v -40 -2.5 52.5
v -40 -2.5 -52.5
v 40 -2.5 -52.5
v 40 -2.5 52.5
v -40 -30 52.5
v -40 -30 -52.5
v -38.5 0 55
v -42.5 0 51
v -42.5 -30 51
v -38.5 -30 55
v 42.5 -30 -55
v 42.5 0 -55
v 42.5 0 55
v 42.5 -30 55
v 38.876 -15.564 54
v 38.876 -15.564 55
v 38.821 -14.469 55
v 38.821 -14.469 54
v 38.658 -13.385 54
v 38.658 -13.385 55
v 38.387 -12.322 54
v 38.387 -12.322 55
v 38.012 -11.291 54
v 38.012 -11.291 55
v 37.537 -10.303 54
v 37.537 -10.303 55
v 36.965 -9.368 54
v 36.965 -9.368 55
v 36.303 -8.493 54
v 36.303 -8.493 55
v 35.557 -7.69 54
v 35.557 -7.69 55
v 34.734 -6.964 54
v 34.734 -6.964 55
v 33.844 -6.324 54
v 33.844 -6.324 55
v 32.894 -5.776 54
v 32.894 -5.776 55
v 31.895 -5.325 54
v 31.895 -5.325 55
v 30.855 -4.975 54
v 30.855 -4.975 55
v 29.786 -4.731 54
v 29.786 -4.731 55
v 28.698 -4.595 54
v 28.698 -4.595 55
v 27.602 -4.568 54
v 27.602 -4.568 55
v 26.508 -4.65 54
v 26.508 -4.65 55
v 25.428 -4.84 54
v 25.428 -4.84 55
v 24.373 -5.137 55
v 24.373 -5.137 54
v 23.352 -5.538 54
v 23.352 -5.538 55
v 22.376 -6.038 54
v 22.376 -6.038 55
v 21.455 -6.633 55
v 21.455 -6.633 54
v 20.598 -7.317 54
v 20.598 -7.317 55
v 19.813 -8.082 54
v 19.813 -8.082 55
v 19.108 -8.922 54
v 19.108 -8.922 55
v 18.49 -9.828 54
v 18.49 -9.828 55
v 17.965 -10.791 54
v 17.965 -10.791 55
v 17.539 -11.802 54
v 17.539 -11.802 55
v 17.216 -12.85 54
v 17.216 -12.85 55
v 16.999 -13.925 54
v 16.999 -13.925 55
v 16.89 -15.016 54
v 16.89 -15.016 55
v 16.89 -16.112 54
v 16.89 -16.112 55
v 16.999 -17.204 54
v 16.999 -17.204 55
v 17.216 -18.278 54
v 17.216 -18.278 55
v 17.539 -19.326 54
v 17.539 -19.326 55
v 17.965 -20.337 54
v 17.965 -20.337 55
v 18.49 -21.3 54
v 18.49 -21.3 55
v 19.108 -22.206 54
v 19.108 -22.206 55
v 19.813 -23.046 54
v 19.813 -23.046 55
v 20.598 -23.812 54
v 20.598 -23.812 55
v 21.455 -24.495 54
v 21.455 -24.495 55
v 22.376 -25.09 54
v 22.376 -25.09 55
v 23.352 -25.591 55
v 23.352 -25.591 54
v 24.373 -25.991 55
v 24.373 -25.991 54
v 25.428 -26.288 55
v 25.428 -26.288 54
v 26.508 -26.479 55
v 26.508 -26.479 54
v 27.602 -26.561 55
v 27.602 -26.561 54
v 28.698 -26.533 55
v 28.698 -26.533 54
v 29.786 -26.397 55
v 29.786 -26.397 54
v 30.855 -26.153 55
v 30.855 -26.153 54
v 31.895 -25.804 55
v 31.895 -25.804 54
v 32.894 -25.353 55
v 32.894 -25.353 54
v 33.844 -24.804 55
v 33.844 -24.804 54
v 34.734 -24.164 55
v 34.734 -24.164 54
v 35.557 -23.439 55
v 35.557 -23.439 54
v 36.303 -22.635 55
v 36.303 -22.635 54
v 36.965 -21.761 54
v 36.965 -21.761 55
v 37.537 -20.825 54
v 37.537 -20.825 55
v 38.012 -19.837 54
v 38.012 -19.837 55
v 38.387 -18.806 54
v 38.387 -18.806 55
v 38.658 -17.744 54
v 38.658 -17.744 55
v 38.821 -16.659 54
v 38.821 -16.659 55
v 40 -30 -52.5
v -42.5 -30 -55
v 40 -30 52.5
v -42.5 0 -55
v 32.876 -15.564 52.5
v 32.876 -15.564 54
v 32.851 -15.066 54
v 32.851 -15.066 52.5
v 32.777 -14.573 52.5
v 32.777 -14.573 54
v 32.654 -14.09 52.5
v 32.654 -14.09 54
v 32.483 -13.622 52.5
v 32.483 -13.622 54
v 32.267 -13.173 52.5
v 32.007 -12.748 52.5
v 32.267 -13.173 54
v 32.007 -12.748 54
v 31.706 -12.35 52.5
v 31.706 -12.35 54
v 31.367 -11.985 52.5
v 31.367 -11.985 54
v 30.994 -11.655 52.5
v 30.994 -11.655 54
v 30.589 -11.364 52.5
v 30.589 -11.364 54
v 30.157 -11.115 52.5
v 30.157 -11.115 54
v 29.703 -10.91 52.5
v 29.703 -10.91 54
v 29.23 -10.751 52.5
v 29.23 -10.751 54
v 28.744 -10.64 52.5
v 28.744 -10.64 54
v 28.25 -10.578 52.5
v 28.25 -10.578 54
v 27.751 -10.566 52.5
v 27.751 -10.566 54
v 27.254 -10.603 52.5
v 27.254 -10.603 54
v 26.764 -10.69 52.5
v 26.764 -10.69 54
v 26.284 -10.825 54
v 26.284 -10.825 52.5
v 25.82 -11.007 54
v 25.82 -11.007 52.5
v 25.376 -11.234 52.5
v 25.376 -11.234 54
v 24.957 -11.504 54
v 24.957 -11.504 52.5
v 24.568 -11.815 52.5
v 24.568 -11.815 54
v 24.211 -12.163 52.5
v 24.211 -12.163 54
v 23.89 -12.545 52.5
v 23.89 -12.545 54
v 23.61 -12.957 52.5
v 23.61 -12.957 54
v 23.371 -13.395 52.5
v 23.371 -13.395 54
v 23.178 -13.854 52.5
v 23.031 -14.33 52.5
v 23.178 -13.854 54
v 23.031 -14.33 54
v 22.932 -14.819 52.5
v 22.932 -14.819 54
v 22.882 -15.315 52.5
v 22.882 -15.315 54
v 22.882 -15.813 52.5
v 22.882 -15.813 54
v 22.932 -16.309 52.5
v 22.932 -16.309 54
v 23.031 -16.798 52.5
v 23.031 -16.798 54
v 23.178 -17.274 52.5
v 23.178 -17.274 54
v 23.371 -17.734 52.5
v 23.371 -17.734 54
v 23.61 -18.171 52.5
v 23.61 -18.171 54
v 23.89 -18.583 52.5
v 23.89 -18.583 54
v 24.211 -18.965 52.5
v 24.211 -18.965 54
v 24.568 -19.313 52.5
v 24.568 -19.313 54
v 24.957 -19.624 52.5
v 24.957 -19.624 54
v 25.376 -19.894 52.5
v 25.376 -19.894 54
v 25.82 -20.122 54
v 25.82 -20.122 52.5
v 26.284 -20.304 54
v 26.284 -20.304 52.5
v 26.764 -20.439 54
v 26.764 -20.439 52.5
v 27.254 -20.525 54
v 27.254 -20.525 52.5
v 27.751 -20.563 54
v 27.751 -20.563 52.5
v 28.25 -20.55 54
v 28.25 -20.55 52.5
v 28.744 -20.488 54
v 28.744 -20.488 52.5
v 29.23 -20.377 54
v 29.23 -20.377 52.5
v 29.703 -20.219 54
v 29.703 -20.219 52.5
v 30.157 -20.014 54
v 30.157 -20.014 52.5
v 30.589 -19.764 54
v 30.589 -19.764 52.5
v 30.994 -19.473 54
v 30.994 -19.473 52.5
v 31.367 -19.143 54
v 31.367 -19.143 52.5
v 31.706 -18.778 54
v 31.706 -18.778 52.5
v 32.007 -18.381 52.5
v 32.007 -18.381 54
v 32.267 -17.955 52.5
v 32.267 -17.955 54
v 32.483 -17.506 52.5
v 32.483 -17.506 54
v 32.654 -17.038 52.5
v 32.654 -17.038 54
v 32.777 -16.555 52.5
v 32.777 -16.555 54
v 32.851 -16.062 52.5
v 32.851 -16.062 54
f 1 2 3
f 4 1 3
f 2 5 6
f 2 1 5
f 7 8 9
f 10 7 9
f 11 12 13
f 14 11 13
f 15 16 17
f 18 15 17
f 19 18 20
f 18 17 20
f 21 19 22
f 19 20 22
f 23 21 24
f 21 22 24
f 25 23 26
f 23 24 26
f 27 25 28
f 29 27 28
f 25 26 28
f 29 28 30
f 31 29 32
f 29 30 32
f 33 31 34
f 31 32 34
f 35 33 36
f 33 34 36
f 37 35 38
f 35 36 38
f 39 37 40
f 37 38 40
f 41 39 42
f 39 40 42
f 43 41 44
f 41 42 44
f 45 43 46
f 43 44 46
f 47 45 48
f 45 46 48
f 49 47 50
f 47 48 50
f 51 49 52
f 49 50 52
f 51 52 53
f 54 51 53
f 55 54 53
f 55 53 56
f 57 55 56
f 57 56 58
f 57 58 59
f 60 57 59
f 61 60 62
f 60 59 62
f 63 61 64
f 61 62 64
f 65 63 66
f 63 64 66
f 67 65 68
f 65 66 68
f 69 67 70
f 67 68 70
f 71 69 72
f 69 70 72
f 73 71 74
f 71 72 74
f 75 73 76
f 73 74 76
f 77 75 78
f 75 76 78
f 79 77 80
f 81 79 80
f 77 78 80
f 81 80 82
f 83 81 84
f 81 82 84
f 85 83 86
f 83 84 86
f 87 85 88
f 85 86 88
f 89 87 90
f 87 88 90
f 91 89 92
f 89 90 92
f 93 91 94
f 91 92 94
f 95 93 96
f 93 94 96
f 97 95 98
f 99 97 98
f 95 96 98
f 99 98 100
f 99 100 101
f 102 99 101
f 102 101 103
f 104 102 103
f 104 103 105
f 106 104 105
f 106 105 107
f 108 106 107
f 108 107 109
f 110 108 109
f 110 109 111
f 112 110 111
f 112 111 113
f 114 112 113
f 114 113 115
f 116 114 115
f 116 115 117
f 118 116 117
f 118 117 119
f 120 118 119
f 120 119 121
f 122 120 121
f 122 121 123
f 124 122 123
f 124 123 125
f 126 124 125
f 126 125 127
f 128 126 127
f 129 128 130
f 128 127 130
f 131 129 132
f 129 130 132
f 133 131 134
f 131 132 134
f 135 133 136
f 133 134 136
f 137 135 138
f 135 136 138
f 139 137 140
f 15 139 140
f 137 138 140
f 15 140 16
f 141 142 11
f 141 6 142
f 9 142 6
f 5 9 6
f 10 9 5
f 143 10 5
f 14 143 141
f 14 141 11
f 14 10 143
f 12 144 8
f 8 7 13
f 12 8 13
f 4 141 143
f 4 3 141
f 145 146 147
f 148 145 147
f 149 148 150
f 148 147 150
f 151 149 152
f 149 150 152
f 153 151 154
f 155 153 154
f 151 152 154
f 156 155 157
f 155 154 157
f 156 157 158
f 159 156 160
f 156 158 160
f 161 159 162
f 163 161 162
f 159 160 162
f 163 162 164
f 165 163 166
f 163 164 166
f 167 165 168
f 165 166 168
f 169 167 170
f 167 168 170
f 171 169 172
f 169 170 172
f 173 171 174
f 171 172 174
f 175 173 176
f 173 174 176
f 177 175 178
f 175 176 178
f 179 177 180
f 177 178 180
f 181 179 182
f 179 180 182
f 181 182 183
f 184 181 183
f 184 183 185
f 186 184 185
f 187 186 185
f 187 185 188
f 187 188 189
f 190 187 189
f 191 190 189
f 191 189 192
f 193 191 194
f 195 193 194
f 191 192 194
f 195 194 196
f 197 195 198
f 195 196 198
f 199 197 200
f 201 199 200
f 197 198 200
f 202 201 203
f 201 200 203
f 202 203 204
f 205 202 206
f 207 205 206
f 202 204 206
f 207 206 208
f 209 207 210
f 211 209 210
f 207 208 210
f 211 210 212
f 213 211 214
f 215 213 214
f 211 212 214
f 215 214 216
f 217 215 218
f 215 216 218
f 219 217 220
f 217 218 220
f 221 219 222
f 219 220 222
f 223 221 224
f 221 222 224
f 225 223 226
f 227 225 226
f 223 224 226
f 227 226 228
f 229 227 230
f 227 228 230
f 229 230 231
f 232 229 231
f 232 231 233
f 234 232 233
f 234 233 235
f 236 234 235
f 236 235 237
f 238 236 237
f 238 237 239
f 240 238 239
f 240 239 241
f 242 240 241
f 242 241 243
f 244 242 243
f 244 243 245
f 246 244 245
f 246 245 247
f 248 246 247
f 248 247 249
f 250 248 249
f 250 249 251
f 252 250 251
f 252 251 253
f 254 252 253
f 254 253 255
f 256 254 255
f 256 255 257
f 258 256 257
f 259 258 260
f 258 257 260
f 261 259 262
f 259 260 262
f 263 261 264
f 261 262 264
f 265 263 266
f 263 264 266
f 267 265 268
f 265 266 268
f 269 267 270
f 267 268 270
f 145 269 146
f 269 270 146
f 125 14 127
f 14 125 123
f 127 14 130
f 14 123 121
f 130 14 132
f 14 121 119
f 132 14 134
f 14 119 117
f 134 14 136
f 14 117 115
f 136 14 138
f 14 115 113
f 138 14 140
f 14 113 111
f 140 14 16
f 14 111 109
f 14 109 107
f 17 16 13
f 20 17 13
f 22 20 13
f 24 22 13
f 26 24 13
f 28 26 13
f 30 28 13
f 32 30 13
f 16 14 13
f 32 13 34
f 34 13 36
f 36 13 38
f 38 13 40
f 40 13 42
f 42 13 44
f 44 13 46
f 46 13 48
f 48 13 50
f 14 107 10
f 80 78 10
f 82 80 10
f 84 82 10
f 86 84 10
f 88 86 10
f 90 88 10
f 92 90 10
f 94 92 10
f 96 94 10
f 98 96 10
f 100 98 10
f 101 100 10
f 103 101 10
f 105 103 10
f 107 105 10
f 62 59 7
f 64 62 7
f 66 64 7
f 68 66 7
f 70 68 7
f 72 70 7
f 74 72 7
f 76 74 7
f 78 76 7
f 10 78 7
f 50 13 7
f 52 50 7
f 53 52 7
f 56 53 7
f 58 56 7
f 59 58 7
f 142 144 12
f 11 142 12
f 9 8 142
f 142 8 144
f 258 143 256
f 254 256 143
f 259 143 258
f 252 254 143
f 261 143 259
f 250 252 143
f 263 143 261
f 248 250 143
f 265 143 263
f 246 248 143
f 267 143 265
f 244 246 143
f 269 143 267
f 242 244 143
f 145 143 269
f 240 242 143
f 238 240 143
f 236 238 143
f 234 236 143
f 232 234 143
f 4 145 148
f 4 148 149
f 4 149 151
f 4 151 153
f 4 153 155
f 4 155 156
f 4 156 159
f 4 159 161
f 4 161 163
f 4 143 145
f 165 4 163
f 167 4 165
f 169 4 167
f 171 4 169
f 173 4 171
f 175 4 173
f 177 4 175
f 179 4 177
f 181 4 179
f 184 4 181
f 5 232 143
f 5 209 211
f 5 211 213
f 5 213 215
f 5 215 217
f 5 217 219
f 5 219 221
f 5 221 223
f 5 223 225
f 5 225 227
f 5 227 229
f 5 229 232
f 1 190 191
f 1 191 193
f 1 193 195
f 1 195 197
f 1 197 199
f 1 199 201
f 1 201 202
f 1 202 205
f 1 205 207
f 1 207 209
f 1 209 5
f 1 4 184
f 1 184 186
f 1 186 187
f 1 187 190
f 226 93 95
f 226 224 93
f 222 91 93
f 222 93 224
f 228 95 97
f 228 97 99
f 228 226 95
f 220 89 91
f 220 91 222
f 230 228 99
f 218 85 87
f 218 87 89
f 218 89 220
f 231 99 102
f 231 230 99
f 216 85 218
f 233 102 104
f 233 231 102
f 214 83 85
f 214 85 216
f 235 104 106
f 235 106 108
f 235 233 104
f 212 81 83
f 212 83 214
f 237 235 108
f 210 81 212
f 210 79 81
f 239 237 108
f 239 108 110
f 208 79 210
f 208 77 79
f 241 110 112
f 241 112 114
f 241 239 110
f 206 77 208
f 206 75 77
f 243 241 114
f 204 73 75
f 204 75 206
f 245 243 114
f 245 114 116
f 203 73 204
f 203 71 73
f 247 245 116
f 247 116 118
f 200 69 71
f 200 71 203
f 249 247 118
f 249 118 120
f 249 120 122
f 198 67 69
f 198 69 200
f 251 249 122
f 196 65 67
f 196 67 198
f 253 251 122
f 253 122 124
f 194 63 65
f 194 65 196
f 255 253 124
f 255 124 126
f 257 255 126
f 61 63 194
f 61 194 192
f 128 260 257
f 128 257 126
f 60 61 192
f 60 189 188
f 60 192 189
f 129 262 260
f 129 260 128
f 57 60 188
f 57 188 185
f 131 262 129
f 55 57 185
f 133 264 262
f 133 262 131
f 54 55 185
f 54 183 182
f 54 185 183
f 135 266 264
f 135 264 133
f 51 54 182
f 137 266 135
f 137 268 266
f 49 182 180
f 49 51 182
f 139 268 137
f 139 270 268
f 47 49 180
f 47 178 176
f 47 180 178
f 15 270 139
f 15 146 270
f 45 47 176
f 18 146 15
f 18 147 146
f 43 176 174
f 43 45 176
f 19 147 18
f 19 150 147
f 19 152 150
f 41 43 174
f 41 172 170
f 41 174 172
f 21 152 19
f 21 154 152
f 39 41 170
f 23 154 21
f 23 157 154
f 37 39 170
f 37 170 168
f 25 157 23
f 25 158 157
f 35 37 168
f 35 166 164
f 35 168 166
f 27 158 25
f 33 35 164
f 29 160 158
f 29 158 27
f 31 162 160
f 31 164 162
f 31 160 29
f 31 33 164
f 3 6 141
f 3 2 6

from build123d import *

# Parameters (mm, degrees)
F1_DEPTH = 30
F2_R     = 11
F3_DEPTH = 0.5
F4_T     = -2.5
F5_R     = 11
F6_DEPTH = 1
F7_R     = 5
F8_DEPTH = 1.5
F9_SIZE2 = 4
F9_SIZE  = 4


with BuildPart() as f1:
    # F0 (on Front) → F1 (new body)
    with BuildSketch(Plane.XZ):
        Polygon((42.5, -55), (42.5, 55), (-24.856195, 55), (-42.5, 37.632745), (-42.5, -55), align=None)
        Polygon((-42.5, 37.632745), (-24.856195, 55), (-42.5, 55), align=None)
    extrude(amount=F1_DEPTH)

    # F2 (on face) → F3 (join)
    with BuildSketch(Plane.XY.offset(55)):
        with Locations((25.320798, -14.402656)):
            Circle(F2_R)
    extrude(amount=-F3_DEPTH)

    # F4
    f4_openings = [f1.faces().sort_by_distance(p)[0] for p in [
        (0, -30, 0),
    ]]
    offset(amount=F4_T, openings=f4_openings)

    # F5 (on face) → F6 (cut)
    with BuildSketch(Plane.XY.offset(55)):
        with Locations((27.876107, -15.56416)):
            Circle(F5_R)
    extrude(amount=-F6_DEPTH, mode=Mode.SUBTRACT)

    # F7 (on face) → F8 (cut)
    with BuildSketch(Plane.XY.offset(54)):
        with Locations((27.876107, -15.56416)):
            Circle(F7_R)
    extrude(amount=-F8_DEPTH, mode=Mode.SUBTRACT)

    # F9
    f9_edges = [f1.edges().sort_by_distance(p)[0] for p in [
        (-42.5, -15, 55),
    ]]
    chamfer(f9_edges, length=F9_SIZE, length2=F9_SIZE2)


solid = f1.part
